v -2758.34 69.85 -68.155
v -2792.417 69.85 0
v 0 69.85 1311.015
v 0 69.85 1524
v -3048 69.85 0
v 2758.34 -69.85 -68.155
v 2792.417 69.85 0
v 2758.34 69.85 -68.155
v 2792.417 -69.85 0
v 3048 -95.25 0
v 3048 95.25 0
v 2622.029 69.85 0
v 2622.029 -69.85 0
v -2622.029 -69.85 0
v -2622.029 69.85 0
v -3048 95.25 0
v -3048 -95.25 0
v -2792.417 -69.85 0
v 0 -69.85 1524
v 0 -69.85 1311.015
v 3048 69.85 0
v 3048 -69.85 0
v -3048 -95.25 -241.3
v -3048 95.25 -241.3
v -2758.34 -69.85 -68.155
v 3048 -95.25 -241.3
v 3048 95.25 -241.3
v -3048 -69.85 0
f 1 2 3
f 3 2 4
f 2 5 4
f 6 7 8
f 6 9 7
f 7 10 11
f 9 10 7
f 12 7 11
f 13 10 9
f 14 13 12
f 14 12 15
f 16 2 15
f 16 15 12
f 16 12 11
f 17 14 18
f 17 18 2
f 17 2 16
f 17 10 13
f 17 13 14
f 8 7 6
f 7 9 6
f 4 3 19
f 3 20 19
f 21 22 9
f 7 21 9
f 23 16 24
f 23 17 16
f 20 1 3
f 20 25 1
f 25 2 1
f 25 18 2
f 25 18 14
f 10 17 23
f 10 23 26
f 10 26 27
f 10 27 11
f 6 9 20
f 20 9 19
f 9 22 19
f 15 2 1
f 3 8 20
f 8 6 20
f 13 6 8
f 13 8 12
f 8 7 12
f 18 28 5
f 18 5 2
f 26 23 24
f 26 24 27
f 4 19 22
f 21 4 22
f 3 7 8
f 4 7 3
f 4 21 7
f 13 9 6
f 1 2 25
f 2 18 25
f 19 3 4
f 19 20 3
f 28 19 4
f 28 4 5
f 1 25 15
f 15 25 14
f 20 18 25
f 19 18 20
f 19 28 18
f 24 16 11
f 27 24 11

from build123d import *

# Parameters (mm, degrees)
F1_DEPTH = 95.25
F2_DEPTH = 69.85


with BuildPart() as f1:
    # F0 (on Front) → F1 (new body, symmetric)
    with BuildSketch(Plane.XZ):
        Polygon((0, -241.3), (0, 0), (-2622.02905, 0), (-2758.339754, -68.155352), (-2792.41743, 0), (-3048, 0), (-3048, -241.3), align=None)
        Polygon((2622.02905, 0), (0, 0), (0, -241.3), (3048, -241.3), (3048, 0), align=None)
        Polygon((-2758.339754, -68.155352), (-2622.02905, 0), (-2792.41743, 0), align=None)
    extrude(amount=F1_DEPTH, both=True)


with BuildPart() as f2:
    # F0 (on Front) → F2 (new body, symmetric)
    with BuildSketch(Plane.XZ):
        Polygon((-2622.02905, 0), (0, 1311.014525), (0, 1524), (-304.8, 1371.6), (-3048, 0), (-2792.41743, 0), align=None)
        Polygon((-2758.339754, -68.155352), (-2622.02905, 0), (-2792.41743, 0), align=None)
    extrude(amount=F2_DEPTH, both=True)


with BuildPart() as f3_1:
    # F3: instance of F2
    add(f2.part.mirror(Plane.YZ))


with BuildPart() as f1_1:
    add(f1.part)

    # F4: cut F2, F3_1
    add(f2.part, mode=Mode.SUBTRACT)
    add(f3_1.part, mode=Mode.SUBTRACT)


solid = Compound([f2.part, f3_1.part, f1_1.part])
